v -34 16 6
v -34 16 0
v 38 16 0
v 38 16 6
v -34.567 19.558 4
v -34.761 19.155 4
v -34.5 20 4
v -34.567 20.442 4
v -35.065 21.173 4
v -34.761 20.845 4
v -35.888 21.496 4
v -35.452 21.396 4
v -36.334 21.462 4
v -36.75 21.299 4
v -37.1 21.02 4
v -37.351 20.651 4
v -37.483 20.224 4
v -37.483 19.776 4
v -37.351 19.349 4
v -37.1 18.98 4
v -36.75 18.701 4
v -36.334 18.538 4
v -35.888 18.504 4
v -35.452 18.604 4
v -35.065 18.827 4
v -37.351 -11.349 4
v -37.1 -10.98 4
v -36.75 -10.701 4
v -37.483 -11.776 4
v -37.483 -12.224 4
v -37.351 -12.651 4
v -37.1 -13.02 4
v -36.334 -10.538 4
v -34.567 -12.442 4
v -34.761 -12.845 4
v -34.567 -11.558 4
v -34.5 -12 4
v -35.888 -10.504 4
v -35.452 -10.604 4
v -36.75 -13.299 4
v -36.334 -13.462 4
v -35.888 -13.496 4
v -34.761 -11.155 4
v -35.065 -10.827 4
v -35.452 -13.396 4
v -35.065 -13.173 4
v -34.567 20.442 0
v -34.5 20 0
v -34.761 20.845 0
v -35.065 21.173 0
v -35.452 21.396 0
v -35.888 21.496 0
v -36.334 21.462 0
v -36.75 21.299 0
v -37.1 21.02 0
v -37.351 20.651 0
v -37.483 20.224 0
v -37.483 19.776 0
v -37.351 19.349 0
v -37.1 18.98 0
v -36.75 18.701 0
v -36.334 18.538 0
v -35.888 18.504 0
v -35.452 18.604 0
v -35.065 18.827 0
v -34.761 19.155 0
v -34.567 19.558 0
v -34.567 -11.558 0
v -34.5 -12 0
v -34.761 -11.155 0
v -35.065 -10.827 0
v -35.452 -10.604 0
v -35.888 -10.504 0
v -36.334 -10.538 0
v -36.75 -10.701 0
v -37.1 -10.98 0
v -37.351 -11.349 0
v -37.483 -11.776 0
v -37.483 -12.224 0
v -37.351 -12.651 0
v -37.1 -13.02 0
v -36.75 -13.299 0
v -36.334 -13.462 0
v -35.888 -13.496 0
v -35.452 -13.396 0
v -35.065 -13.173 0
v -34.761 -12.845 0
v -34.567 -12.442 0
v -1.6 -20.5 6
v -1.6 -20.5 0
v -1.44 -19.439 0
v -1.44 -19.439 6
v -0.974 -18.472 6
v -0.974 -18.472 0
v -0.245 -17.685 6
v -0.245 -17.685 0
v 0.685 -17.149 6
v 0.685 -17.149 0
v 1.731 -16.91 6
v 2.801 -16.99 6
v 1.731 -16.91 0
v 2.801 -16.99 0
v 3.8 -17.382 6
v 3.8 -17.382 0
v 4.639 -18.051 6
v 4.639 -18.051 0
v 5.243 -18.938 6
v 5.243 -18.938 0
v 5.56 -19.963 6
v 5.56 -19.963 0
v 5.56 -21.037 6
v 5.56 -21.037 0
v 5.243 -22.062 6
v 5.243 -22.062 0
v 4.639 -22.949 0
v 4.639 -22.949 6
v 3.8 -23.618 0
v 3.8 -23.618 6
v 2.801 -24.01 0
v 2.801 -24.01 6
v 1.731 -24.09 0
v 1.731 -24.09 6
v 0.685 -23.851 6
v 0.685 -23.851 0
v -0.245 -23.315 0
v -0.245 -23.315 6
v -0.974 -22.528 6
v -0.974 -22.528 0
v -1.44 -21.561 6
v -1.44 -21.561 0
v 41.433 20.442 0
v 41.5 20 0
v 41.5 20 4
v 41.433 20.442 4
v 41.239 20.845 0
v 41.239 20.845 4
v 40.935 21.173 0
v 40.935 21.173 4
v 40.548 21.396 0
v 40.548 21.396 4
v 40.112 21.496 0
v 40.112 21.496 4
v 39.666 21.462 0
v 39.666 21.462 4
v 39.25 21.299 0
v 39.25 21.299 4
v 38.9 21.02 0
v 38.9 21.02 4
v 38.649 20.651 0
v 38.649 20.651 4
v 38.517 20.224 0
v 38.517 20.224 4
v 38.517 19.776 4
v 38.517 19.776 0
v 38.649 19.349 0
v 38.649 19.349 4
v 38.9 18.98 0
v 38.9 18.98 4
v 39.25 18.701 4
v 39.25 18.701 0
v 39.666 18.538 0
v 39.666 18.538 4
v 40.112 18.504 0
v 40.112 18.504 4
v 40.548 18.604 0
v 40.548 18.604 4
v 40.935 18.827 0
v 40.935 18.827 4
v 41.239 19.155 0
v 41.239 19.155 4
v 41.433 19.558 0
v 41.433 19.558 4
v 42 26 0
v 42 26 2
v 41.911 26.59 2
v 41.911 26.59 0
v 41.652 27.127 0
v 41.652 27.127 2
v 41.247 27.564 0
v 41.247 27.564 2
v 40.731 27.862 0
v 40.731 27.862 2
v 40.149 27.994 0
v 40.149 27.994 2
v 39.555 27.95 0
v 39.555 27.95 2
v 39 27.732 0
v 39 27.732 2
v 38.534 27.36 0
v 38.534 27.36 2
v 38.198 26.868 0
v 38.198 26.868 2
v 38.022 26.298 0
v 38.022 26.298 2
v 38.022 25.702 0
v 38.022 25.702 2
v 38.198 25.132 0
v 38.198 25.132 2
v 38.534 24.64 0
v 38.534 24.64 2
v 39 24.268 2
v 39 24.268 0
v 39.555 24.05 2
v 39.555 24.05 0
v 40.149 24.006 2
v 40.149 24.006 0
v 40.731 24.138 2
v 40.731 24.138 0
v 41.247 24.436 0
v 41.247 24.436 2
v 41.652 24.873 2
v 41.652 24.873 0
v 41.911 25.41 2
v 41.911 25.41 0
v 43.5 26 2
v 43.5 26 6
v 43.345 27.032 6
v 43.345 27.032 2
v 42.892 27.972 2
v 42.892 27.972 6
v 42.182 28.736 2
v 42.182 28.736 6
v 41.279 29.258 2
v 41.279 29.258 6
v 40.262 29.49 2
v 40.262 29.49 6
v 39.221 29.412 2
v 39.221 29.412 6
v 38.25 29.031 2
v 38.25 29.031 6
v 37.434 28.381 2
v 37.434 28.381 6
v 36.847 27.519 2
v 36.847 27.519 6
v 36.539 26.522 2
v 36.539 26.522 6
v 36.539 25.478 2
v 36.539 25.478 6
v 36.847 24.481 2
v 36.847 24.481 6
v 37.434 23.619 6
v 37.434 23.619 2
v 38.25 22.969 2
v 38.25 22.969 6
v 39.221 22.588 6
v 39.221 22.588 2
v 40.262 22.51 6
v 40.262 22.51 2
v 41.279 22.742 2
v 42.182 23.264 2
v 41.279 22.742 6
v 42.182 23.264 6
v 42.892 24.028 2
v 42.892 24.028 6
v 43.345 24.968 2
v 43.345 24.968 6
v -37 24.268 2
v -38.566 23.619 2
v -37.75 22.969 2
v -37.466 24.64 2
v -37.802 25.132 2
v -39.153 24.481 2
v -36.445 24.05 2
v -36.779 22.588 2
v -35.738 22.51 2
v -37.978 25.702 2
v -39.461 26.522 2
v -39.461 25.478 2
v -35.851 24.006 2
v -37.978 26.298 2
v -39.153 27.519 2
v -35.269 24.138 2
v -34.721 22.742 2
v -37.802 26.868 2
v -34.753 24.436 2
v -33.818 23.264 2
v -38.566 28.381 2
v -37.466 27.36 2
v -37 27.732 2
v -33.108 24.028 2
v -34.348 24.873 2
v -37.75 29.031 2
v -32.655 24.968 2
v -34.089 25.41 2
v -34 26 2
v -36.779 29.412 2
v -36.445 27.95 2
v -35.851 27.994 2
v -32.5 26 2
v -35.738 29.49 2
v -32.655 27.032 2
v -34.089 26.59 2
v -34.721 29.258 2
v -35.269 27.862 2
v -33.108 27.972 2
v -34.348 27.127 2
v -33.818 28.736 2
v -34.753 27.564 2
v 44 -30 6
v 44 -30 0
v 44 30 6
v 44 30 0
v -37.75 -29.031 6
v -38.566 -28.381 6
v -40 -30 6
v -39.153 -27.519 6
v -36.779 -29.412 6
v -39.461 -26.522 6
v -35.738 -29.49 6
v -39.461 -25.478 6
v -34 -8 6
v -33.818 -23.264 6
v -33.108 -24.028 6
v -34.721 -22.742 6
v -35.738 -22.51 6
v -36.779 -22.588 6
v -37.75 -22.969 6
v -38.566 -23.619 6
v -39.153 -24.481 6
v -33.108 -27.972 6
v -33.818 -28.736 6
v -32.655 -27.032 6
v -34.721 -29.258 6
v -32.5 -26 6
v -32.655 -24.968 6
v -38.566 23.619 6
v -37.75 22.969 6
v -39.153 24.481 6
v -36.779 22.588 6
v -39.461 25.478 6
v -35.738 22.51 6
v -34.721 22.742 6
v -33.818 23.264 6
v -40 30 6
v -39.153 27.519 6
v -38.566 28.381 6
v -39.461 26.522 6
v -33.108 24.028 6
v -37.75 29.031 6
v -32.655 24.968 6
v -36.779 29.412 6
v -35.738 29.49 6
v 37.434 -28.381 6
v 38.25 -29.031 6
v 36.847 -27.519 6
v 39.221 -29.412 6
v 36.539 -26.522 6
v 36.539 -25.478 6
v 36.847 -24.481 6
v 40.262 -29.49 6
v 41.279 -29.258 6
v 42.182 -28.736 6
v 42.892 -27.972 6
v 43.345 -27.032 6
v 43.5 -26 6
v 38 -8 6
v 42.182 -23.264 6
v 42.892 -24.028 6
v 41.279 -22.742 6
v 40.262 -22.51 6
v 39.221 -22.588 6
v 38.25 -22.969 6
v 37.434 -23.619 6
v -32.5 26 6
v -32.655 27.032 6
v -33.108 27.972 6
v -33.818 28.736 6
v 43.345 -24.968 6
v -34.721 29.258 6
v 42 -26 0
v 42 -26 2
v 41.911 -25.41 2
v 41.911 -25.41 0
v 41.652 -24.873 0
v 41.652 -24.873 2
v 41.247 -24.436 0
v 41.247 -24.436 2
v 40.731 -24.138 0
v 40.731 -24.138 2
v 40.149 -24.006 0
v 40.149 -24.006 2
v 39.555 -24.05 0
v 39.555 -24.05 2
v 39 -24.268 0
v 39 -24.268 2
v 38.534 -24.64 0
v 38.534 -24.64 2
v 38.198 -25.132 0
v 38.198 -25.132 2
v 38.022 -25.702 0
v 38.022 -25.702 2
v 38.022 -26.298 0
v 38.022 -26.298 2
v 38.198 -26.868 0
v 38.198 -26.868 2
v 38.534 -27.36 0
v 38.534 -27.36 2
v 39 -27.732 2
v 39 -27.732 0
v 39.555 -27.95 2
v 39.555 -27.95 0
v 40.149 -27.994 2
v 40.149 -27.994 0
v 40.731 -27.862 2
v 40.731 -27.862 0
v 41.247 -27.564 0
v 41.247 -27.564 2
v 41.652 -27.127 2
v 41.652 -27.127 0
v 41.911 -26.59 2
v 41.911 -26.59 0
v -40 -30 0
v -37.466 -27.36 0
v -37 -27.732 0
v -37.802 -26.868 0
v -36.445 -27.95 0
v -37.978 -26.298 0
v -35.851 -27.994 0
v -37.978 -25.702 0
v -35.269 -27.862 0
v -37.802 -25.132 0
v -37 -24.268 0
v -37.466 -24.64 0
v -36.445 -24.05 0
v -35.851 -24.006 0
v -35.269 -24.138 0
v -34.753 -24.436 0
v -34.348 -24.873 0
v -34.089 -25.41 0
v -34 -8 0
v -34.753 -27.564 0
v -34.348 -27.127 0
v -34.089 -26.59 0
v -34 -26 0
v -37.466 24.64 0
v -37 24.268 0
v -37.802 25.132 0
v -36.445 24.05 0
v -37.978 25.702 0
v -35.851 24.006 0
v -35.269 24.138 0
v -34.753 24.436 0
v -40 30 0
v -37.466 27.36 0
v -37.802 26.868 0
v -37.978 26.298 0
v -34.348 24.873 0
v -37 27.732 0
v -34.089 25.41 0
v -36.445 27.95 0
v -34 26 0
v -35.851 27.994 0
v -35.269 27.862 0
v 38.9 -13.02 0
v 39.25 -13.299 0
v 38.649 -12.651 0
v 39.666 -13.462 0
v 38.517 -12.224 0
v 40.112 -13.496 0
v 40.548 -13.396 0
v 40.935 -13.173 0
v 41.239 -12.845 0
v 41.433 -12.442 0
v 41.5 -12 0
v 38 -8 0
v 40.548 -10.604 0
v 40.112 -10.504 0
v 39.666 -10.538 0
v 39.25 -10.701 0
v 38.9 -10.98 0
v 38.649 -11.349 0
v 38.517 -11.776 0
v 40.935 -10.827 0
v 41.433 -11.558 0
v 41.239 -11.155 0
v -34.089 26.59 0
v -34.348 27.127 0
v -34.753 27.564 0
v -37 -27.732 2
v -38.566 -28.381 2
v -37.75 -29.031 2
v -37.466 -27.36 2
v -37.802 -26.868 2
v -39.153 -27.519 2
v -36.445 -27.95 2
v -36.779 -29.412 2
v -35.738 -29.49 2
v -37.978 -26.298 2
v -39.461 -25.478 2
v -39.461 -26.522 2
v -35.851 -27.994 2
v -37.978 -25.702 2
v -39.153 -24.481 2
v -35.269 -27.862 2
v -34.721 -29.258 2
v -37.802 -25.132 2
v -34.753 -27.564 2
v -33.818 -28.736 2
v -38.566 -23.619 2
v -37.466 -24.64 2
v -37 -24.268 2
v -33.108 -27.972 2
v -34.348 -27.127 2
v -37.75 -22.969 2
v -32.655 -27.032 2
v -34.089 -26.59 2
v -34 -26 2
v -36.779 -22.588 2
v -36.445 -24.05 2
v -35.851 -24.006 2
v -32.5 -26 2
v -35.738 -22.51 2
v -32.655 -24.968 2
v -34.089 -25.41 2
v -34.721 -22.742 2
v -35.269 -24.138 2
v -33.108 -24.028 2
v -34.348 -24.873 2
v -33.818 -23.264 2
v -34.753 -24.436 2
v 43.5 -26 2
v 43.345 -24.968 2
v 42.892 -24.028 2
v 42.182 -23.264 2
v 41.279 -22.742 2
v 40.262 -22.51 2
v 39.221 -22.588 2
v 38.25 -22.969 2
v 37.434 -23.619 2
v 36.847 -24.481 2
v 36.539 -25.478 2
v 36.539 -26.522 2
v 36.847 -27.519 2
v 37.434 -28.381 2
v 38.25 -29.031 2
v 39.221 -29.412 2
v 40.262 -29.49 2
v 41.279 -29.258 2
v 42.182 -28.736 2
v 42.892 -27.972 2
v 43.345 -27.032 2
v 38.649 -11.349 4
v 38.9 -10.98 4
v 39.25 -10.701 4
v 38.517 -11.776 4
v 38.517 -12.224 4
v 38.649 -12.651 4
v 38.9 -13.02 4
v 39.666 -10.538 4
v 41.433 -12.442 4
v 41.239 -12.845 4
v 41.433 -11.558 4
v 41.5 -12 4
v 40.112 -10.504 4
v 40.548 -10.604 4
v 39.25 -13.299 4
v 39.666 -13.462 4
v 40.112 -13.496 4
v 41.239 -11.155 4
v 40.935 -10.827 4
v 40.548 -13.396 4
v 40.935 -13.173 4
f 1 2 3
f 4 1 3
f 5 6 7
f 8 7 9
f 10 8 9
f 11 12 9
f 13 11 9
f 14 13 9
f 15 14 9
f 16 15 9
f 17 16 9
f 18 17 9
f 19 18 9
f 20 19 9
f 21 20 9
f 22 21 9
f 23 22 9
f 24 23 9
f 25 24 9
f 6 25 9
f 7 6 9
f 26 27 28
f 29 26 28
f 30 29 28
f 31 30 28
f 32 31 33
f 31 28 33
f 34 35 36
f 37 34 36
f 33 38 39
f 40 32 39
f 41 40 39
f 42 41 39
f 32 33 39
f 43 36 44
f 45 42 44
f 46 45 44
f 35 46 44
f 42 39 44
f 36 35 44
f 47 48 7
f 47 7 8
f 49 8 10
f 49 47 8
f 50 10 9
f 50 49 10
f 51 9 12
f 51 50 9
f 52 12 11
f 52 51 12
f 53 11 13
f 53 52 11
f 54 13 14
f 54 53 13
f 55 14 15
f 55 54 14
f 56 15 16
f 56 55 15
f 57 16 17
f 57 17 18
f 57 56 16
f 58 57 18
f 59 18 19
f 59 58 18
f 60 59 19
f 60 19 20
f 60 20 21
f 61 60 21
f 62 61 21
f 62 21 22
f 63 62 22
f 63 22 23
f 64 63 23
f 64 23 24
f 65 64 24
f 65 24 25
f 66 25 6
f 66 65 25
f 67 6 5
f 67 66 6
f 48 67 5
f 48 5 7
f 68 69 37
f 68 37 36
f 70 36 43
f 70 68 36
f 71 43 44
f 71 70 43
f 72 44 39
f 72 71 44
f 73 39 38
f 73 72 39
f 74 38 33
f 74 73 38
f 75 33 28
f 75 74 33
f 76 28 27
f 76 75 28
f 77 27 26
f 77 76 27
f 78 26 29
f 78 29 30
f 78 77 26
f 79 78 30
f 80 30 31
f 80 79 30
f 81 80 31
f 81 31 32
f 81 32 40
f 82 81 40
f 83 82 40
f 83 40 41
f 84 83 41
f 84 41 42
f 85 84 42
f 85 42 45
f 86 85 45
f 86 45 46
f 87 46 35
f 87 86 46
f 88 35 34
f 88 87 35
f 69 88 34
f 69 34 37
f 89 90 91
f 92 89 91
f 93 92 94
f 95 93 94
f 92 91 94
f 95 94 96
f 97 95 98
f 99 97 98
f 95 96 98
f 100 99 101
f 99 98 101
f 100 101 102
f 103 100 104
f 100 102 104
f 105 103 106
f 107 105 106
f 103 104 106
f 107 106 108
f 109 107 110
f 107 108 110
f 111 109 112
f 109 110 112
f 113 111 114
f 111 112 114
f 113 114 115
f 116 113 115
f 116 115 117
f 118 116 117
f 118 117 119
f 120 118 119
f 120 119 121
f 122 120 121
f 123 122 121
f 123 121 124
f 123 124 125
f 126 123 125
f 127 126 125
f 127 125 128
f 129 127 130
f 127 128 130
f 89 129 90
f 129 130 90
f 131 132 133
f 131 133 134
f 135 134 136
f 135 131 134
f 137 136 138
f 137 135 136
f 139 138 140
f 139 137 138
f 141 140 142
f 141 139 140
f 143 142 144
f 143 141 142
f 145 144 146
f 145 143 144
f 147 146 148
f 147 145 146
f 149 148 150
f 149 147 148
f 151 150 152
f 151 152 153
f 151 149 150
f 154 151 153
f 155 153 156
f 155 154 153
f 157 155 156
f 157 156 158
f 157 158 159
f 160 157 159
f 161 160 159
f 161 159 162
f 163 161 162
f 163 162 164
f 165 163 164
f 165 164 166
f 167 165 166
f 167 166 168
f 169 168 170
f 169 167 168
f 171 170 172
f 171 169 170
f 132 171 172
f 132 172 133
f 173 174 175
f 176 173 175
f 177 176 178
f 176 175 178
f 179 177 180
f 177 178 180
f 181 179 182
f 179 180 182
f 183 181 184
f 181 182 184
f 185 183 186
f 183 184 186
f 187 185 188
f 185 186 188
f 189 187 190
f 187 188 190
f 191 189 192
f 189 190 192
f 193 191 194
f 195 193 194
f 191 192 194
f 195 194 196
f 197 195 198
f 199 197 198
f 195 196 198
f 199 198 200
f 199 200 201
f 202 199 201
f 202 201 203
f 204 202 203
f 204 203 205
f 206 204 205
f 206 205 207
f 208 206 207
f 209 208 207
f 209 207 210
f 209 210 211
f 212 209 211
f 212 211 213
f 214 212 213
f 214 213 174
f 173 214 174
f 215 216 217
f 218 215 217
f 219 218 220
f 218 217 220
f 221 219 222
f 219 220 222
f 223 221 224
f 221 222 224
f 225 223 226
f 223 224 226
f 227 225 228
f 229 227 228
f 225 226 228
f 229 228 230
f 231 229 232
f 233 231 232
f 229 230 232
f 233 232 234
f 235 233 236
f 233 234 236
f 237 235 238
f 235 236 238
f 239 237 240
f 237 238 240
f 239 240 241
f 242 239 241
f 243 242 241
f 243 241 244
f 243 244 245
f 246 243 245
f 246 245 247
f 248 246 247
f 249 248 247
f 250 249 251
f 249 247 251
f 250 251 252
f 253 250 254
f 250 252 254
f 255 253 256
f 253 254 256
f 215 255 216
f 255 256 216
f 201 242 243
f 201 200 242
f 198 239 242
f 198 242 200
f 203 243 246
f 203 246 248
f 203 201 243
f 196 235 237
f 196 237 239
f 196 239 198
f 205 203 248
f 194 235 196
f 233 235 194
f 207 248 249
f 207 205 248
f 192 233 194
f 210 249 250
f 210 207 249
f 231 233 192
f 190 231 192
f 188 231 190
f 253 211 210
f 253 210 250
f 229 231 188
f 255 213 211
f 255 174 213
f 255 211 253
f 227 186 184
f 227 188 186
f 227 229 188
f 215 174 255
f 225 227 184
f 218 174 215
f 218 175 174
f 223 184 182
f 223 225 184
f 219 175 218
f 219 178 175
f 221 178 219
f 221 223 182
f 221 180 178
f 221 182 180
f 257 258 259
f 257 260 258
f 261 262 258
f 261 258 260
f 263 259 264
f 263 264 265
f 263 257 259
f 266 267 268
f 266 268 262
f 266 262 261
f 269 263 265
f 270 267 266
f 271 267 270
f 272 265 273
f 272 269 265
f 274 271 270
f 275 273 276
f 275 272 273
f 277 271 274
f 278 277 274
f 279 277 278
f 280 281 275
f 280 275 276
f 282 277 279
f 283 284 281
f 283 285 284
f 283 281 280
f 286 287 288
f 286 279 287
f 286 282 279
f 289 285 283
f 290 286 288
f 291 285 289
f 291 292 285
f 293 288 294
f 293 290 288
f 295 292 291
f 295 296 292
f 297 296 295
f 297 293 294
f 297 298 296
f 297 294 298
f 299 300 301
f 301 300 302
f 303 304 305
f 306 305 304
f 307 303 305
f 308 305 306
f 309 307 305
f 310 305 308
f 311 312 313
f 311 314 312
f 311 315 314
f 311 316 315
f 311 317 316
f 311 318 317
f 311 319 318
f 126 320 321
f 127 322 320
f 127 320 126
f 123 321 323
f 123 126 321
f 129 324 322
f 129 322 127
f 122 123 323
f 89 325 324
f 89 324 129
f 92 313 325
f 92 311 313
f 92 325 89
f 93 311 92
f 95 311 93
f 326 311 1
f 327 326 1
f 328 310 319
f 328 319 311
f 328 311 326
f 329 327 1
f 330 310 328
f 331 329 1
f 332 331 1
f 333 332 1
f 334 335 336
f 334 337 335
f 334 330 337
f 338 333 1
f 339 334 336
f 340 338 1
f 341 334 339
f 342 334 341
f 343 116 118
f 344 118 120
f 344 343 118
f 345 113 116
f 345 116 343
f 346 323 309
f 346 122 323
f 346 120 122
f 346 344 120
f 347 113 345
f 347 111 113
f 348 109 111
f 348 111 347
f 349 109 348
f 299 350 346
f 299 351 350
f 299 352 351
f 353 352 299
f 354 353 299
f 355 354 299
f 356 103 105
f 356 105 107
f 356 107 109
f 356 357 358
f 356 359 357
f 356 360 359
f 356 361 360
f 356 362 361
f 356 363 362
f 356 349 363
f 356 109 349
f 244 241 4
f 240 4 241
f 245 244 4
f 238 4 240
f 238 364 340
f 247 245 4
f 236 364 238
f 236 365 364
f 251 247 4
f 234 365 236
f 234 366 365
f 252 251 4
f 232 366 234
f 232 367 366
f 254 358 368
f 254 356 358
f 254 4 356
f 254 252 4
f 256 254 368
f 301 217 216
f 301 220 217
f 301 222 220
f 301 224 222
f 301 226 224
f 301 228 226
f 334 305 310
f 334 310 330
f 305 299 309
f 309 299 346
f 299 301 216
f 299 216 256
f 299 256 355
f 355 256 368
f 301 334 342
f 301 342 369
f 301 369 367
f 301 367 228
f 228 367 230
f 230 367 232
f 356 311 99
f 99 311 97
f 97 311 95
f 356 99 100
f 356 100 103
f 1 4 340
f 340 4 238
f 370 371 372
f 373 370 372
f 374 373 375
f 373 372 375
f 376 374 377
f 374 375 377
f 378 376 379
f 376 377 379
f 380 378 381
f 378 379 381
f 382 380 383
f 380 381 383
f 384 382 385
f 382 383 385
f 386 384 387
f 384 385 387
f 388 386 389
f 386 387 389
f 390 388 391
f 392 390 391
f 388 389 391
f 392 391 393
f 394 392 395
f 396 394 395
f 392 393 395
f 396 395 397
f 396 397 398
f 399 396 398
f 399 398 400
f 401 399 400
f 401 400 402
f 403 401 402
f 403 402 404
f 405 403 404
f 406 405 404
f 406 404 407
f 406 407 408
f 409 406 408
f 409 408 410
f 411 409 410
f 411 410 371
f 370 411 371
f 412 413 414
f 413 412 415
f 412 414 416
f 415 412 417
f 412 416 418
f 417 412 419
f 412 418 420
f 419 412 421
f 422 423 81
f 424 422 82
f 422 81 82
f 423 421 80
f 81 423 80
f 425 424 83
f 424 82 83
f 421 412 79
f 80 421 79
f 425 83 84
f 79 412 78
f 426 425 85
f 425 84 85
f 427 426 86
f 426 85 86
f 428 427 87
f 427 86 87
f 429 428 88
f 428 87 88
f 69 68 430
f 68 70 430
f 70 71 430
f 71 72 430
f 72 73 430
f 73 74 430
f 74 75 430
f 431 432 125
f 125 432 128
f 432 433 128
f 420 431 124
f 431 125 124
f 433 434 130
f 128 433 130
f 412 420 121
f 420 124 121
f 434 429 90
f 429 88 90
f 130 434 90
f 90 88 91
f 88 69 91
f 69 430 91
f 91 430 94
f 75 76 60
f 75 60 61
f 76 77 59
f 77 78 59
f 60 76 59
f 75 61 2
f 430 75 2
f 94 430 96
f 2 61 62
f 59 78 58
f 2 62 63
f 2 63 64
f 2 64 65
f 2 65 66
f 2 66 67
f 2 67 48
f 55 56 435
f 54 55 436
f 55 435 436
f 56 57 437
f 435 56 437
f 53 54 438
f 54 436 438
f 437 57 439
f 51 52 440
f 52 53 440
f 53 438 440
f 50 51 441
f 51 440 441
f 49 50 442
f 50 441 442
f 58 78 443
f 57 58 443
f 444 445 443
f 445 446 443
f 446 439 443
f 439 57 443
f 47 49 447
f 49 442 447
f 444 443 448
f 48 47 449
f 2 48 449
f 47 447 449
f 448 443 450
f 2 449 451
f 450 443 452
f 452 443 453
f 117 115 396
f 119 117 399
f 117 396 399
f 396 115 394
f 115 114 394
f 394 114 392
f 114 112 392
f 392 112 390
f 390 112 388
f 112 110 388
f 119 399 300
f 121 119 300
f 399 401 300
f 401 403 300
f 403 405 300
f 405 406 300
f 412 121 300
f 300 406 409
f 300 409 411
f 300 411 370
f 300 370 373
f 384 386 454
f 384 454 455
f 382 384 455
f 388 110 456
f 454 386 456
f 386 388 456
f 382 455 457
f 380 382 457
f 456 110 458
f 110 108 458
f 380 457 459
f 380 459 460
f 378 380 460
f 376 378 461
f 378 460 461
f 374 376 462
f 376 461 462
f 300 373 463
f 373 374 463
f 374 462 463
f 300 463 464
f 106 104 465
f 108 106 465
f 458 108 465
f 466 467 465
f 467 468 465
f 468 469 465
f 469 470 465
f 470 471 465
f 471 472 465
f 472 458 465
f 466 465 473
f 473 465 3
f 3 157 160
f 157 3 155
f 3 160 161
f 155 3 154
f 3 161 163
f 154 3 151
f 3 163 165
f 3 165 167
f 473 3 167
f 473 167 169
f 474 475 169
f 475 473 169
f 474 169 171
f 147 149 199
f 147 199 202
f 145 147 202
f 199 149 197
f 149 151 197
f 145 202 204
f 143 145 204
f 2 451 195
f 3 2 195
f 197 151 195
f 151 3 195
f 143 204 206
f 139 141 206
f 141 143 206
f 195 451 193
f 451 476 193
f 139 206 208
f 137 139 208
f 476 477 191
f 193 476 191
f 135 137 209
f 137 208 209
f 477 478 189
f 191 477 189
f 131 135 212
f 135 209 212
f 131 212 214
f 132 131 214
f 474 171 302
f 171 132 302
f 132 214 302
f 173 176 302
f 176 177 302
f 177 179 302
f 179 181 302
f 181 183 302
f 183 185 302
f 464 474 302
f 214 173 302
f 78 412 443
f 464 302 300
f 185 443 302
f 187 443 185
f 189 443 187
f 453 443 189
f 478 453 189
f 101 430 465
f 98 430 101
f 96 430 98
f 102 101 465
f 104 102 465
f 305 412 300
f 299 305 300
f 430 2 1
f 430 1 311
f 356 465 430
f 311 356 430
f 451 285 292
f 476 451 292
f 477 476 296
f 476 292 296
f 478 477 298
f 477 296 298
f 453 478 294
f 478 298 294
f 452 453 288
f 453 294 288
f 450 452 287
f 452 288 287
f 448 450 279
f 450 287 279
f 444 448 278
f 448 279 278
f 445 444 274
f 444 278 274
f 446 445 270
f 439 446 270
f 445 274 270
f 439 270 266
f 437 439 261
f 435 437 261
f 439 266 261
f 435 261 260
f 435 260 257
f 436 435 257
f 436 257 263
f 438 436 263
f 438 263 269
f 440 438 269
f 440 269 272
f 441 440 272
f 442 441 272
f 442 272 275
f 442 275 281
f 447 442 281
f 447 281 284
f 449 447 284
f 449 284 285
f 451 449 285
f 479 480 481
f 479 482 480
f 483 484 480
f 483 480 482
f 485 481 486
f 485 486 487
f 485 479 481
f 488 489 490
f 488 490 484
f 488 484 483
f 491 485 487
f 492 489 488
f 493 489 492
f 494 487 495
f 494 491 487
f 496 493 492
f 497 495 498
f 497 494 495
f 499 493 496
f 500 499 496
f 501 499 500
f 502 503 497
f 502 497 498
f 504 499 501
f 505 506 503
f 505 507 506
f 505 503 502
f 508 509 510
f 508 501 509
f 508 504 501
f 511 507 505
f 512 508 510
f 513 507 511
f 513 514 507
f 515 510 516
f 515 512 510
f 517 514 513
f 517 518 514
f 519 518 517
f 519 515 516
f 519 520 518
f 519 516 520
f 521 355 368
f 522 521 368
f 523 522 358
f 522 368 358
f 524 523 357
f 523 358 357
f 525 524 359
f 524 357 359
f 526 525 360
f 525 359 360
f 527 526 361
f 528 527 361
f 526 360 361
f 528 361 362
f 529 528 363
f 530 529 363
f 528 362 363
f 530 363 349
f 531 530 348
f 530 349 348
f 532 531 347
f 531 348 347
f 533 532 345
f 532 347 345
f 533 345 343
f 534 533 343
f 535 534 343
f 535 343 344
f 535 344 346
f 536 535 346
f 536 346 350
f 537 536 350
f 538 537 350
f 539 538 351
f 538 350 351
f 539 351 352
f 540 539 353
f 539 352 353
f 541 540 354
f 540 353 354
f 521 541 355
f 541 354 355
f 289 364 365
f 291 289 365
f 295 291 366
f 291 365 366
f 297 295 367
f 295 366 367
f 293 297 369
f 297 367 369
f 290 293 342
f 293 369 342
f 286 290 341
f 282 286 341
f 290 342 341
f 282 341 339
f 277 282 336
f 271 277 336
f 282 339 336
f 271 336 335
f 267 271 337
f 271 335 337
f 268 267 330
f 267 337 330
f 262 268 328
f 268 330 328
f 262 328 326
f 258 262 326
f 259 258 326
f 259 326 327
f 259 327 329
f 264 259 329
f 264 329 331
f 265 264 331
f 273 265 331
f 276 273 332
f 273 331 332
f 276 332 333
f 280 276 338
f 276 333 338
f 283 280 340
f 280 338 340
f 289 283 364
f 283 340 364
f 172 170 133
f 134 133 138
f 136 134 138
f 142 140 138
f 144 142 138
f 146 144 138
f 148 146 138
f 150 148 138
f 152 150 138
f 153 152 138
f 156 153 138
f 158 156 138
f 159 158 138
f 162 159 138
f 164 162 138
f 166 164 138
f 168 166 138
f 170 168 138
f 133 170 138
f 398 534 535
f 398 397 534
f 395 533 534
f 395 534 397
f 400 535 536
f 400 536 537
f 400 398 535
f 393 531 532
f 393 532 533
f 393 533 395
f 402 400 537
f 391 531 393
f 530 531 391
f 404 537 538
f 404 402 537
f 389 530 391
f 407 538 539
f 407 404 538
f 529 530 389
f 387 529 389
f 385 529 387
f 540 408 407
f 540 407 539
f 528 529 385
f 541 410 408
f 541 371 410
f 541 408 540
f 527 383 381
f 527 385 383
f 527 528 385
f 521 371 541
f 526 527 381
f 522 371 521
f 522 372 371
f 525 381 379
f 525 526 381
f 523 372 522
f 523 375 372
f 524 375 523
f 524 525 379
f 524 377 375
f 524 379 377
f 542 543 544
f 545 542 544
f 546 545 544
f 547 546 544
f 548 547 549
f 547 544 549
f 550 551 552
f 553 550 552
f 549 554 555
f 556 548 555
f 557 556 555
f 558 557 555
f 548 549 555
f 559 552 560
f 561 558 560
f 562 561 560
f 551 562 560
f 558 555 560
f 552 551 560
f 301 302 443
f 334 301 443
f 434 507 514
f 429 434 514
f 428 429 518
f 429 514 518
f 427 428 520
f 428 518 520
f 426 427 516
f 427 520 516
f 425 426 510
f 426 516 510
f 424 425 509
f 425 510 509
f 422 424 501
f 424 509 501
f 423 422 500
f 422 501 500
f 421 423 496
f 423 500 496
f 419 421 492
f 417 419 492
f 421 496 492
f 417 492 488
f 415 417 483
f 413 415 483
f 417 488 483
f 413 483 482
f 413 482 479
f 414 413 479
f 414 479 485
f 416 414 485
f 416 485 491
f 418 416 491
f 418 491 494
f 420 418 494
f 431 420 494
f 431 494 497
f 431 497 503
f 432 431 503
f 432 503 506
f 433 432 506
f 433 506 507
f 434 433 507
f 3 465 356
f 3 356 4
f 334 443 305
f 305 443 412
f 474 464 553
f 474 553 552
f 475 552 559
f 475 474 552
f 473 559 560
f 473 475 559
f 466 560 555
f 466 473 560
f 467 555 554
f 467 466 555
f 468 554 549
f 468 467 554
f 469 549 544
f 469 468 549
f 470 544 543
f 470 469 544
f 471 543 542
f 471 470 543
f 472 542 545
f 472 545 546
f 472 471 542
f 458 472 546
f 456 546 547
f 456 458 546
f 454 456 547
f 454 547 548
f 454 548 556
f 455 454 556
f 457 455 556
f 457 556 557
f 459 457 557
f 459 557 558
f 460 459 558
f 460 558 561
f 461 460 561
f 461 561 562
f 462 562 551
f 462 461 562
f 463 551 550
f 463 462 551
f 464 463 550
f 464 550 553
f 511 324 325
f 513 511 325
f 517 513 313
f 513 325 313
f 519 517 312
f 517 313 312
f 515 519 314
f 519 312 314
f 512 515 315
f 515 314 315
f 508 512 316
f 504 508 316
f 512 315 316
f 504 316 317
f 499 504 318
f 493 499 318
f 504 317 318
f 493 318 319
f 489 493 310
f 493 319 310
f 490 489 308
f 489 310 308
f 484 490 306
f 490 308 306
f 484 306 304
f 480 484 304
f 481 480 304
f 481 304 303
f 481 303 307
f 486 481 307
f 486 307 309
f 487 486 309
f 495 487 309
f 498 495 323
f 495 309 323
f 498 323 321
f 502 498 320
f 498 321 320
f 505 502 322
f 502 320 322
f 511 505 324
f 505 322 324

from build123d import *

# Parameters (mm, degrees)
BOSS_EXTRUDE1_DEPTH = 6
SKETCH3_R           = 3.5
CUT_EXTRUDE2_DEPTH  = 4
SKETCH4_R           = 2
CUT_EXTRUDE3_DEPTH  = 6
SKETCH6_R           = 3.6
CUT_EXTRUDE4_DEPTH  = 6
CUT_EXTRUDE6_START  = -6
SKETCH10_R          = 1.5
CUT_EXTRUDE6_DEPTH  = 4


with BuildPart() as part:
    # Sketch1 → Boss-Extrude1 (new body)
    with BuildSketch(Plane.XY):
        Polygon((-37, 30), (-40, 30), (-40, 27), (-40, -27), (-40, -30), (-37, -30), (37, -30), (44, -30), (44, -27), (44, 27), (44, 30), (37, 30), align=None)
    extrude(amount=BOSS_EXTRUDE1_DEPTH)

    # Sketch3 → Cut-Extrude2 (cut)
    with BuildSketch(Plane.XY.offset(6)):
        with Locations((-36, 26)):
            Circle(SKETCH3_R)
        with Locations((40, 26)):
            Circle(SKETCH3_R)
        with Locations((40, -26)):
            Circle(SKETCH3_R)
        with Locations((-36, -26)):
            Circle(SKETCH3_R)
    extrude(amount=-CUT_EXTRUDE2_DEPTH, mode=Mode.SUBTRACT)

    # Sketch4 → Cut-Extrude3 (cut)
    with BuildSketch(Plane.XY.offset(6)):
        with Locations((-36, 26)):
            Circle(SKETCH4_R)
        with Locations((40, 26)):
            Circle(SKETCH4_R)
        with Locations((40, -26)):
            Circle(SKETCH4_R)
        with Locations((-36, -26)):
            Circle(SKETCH4_R)
    extrude(amount=-CUT_EXTRUDE3_DEPTH, mode=Mode.SUBTRACT)

    # Sketch6 → Cut-Extrude4 (cut)
    with BuildSketch(Plane(origin=(0, 0, 0), x_dir=(-1, 0, 0), z_dir=(0, 0, -1))):
        with Locations((-2, -20.5)):
            Circle(SKETCH6_R)
        Polygon((30.5, -8), (-34.5, -8), (-38, -8), (-38, 16), (-2, 16), (34, 16), (34, -8), align=None)
    extrude(amount=-CUT_EXTRUDE4_DEPTH, mode=Mode.SUBTRACT)

    # Sketch10 → Cut-Extrude6 (cut)
    with BuildSketch(Plane.XY.offset(6).offset(CUT_EXTRUDE6_START)):
        with Locations((-36, 20)):
            Circle(SKETCH10_R)
        with Locations((40, 20)):
            Circle(SKETCH10_R)
        with Locations((40, -12)):
            Circle(SKETCH10_R)
        with Locations((-36, -12)):
            Circle(SKETCH10_R)
    extrude(amount=CUT_EXTRUDE6_DEPTH, mode=Mode.SUBTRACT)


solid = part.part
